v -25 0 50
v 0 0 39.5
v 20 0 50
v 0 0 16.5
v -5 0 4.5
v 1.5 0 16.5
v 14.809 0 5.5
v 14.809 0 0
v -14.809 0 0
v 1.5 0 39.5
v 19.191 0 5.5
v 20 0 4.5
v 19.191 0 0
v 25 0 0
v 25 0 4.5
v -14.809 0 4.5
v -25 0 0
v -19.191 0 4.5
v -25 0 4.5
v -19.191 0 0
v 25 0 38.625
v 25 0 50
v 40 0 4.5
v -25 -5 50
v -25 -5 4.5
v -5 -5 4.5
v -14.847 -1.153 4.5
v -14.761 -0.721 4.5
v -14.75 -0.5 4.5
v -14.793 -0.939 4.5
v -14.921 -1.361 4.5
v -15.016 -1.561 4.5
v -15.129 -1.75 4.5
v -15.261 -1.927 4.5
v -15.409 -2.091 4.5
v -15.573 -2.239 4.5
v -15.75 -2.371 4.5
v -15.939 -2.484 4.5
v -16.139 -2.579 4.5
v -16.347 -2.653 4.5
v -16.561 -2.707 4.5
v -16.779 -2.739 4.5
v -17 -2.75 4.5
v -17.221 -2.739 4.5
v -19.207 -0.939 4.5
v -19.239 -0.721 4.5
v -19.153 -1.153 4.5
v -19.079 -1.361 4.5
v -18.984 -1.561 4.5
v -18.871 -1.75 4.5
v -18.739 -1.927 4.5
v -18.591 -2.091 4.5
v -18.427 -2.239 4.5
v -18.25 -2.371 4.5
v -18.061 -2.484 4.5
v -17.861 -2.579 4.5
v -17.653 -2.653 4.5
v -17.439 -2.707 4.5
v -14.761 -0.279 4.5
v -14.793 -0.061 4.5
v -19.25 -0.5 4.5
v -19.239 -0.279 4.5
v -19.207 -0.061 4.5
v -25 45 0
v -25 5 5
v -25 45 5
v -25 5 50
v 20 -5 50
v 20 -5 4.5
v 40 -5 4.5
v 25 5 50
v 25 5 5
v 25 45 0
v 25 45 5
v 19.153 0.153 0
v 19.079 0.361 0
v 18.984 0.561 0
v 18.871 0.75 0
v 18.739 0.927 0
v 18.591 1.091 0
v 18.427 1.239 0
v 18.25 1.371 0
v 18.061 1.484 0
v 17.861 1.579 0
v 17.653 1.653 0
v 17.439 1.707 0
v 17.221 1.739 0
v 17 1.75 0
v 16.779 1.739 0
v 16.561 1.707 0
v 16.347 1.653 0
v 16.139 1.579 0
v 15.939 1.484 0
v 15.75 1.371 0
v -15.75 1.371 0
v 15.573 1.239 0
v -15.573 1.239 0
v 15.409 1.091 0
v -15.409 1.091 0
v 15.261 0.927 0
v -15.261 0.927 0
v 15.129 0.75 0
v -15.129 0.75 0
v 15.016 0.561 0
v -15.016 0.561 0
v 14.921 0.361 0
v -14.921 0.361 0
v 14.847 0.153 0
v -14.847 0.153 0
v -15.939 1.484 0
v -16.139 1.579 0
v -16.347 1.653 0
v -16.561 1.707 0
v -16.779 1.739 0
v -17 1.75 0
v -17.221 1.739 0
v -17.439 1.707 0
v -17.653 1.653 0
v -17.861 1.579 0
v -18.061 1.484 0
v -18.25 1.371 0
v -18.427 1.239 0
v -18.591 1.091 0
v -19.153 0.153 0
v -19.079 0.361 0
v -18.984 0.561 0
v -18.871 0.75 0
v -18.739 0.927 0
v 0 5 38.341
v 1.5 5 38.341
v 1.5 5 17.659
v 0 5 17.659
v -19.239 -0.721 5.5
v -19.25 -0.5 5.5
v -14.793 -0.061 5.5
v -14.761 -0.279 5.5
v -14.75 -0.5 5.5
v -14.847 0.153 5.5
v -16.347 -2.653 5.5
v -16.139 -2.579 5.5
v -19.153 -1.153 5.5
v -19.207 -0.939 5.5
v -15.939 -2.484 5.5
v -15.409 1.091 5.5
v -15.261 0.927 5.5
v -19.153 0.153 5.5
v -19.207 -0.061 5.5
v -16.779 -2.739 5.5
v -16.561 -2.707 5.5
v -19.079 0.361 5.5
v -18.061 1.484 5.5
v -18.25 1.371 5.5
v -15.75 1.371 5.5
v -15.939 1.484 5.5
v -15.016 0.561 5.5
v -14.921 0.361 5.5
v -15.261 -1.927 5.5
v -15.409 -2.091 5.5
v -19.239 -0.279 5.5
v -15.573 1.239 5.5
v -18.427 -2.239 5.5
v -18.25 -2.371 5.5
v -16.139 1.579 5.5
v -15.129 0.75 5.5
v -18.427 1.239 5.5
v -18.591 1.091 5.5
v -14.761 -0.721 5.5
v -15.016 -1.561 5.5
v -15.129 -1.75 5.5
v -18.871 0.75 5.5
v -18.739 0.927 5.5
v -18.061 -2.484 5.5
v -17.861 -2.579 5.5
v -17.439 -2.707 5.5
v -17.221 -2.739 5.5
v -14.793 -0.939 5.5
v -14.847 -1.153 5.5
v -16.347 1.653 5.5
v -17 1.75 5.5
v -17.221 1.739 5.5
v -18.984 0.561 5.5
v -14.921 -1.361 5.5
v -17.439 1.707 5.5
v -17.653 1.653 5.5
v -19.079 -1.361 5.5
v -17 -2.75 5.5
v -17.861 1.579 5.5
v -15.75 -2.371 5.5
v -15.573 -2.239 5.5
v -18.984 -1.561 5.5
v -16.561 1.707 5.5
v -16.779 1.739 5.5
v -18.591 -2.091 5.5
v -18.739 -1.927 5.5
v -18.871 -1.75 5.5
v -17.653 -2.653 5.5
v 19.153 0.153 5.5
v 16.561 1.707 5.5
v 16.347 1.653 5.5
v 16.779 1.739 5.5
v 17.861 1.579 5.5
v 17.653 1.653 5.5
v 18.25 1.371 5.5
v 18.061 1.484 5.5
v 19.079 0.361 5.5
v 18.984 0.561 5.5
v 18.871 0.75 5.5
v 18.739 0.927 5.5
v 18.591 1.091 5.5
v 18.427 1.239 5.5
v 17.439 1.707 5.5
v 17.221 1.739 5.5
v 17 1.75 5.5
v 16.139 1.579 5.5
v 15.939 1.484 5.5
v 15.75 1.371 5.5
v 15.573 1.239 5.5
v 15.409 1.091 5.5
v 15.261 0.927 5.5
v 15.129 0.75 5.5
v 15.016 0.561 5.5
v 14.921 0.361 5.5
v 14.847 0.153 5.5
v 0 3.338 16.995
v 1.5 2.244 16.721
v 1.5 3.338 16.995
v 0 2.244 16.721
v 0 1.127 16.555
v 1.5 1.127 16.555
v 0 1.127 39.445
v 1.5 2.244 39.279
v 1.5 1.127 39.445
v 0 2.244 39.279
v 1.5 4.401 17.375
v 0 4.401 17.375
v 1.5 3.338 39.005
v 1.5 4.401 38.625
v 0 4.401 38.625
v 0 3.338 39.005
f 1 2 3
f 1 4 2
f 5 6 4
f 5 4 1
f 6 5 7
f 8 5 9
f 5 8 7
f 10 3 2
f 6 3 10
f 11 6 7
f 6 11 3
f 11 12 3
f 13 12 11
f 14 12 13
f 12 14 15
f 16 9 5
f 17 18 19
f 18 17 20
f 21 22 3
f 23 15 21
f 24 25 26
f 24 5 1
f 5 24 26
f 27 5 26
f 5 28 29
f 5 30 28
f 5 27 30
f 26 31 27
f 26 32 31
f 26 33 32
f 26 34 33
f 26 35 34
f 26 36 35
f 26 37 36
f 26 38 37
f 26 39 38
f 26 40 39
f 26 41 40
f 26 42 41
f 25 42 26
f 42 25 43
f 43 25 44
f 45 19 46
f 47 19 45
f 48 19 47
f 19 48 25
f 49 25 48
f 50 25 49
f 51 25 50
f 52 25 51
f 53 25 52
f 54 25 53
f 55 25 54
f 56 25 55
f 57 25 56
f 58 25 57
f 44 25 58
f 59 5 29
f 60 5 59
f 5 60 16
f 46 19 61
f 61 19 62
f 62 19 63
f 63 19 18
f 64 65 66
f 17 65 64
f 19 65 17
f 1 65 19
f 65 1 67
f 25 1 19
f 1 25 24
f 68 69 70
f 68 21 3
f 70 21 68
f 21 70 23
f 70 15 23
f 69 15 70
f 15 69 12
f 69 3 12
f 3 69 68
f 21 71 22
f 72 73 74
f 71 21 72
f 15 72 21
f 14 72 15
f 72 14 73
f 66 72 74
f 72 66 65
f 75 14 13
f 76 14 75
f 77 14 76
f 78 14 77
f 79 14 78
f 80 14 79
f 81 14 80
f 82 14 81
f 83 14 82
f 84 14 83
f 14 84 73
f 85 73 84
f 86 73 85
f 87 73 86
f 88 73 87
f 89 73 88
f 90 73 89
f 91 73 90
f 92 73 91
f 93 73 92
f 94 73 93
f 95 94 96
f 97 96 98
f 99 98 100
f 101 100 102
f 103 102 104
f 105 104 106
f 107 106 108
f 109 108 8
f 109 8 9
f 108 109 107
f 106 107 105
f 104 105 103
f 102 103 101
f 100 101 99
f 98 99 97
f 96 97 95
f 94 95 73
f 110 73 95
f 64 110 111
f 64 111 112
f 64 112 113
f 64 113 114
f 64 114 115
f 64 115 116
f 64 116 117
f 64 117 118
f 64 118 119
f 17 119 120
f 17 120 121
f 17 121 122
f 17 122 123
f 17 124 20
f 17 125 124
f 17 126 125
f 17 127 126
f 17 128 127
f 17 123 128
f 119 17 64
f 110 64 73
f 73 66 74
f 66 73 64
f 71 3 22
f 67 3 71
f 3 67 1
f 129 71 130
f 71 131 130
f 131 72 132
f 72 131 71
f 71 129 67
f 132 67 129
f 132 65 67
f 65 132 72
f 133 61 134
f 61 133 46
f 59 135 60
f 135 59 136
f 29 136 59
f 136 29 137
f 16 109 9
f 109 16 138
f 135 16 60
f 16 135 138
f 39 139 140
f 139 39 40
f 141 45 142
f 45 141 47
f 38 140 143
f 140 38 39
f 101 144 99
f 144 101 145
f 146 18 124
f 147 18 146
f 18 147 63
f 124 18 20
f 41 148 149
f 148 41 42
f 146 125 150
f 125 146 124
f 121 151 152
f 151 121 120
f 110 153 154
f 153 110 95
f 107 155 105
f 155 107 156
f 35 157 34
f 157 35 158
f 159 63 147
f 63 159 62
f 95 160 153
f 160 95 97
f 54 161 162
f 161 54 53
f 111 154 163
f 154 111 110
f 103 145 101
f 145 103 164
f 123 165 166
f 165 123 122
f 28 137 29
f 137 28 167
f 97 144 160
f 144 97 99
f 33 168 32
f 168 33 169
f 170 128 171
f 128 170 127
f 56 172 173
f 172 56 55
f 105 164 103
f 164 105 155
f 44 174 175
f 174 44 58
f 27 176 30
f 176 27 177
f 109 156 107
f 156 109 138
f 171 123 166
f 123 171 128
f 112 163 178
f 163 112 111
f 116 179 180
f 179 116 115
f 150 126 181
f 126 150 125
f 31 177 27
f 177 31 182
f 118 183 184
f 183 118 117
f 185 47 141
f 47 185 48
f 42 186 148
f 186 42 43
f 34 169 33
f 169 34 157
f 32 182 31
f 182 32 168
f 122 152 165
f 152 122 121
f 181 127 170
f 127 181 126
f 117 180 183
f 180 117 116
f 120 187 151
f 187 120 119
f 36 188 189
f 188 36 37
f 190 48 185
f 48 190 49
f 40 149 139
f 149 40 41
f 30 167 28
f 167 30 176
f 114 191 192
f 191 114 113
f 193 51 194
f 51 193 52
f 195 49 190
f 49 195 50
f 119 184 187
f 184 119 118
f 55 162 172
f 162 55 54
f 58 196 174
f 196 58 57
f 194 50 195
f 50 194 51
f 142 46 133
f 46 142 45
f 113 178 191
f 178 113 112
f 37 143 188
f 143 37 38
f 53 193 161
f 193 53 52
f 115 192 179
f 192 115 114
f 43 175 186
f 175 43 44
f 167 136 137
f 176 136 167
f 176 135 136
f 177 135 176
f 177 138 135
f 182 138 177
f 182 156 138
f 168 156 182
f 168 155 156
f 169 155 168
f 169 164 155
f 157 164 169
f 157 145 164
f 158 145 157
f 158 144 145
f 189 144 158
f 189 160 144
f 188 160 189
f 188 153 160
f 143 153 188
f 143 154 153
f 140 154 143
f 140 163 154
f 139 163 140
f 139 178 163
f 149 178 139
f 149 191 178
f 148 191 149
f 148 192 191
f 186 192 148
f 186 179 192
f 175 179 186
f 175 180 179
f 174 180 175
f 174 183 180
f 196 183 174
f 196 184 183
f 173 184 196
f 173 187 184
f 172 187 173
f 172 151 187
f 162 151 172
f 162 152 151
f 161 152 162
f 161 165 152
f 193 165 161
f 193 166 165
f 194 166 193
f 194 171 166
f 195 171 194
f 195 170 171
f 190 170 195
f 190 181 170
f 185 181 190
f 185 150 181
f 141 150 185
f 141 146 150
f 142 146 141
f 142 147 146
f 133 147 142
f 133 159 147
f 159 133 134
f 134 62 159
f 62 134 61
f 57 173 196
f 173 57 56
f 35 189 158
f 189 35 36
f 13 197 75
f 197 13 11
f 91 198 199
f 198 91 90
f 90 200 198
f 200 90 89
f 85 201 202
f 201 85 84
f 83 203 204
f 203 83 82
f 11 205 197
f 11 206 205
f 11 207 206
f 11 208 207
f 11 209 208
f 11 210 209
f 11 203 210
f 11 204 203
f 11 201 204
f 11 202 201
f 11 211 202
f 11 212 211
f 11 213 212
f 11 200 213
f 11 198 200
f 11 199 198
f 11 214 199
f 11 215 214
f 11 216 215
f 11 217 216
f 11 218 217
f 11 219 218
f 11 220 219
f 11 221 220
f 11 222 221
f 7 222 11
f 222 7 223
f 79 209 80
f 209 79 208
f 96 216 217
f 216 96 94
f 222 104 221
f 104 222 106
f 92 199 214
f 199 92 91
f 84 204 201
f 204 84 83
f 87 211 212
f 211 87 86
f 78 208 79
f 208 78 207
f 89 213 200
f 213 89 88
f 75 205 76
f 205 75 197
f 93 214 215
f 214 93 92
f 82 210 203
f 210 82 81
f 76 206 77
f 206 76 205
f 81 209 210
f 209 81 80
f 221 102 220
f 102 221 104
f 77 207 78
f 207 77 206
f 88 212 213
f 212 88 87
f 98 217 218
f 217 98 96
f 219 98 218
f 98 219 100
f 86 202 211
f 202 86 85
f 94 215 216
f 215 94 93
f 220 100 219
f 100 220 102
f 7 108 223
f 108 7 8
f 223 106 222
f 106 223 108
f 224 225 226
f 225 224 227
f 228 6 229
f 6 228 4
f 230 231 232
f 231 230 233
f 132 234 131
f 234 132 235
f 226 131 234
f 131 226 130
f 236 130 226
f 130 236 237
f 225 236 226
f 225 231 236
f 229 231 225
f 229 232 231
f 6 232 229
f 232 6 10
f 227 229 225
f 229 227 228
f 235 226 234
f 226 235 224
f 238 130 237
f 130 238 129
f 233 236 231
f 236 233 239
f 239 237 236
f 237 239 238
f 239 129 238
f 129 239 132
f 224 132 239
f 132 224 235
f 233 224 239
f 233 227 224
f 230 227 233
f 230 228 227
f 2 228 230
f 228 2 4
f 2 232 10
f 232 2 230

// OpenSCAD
// L-shaped mounting bracket for NEMA 17 stepper motor (e.g. syringe pump)
// Print orientation: base plate on bed, motor plate builds upward (+Z)

$fn = 64;

// ---- Base plate ----
base_x0 = -25;      // plate x start
base_x1 = 25;       // plate x end
base_y0 = 0;        // plate y start
base_y1 = 45;       // plate y end
base_t  = 5;        // plate thickness (z)

// ---- Motor plate ----
motor_x0 = -25;     // plate x start
motor_x1 = 25;      // plate x end
motor_y0 = 0;       // plate y start
motor_y1 = 5;       // plate y end (back edge of base)
motor_h  = 50;      // plate height (z)

// ---- Boss hole ----
boss_d     = 23;    // motor centring boss hole diameter
boss_x     = 0;     // hole centre x
boss_z     = 28;    // hole centre z
boss_h     = 1;     // cutter overshoot past top face

// ---- Screw holes ----
screw_d     = 3.4;  // M3 screw hole diameter
screw_pitch = 31;   // square pattern side length
screw_n     = 4;    // number of holes
screw_z     = 28;   // hole depth from top face

// ---- Gussets ----
gusset_t     = 5;   // gusset thickness (x)
gusset_leg   = 20;  // right triangle leg lengths (Y and Z)
gusset_x0    = -25; // left gusset x start
gusset_x1    = -20; // left gusset x end
gusset_x2    = 20;  // right gusset x start
gusset_x3    = 25;  // right gusset x end

// ---- Misc ----
eps = 0.5;          // cutter overshoot for through-holes

difference() {
    union() {
        // Base plate
        translate([base_x0, base_y0, 0])
            cube([base_x1 - base_x0, base_y1 - base_y0, base_t]);

        // Motor plate
        translate([motor_x0, motor_y0, 0])
            cube([motor_x1 - motor_x0, motor_y1 - motor_y0, motor_h]);

        // Gussets (right triangle in YZ plane, flush with edges)
        for (sx = [-1, 1])
            translate([sx > 0 ? gusset_x2 : gusset_x0, 0, 0])
                rotate([90, 0, 0])
                    linear_extrude(height = gusset_t)
                        polygon([
                            [gusset_leg, base_t - eps],   // bottom right (slightly inside base)
                            [0, base_t - eps],            // bottom left
                            [0, motor_h]                   // top left
                        ]);
    }

    // Base plate through-holes (M4)
    for (hx = [-17, 17])
        translate([hx, base_y0 - eps, -eps])
            cylinder(d = 4.5, h = base_t + 2 * eps);

    // Boss hole for motor centring boss
    translate([boss_x, 0, boss_z])
        rotate([0, 90, 0])
            cylinder(d = boss_d, h = boss_h + eps);

    // M3 screw holes on square pattern, centred on boss hole
    for (i = [0 : screw_n - 1]) {
        x = (i - (screw_n - 1) / 2) * screw_pitch;
        y = (i % 2 - (screw_n - 1) / 2) * screw_pitch;
        translate([x, y, motor_y1 - screw_z])
            cylinder(d = screw_d, h = screw_z + eps);
    }
}
